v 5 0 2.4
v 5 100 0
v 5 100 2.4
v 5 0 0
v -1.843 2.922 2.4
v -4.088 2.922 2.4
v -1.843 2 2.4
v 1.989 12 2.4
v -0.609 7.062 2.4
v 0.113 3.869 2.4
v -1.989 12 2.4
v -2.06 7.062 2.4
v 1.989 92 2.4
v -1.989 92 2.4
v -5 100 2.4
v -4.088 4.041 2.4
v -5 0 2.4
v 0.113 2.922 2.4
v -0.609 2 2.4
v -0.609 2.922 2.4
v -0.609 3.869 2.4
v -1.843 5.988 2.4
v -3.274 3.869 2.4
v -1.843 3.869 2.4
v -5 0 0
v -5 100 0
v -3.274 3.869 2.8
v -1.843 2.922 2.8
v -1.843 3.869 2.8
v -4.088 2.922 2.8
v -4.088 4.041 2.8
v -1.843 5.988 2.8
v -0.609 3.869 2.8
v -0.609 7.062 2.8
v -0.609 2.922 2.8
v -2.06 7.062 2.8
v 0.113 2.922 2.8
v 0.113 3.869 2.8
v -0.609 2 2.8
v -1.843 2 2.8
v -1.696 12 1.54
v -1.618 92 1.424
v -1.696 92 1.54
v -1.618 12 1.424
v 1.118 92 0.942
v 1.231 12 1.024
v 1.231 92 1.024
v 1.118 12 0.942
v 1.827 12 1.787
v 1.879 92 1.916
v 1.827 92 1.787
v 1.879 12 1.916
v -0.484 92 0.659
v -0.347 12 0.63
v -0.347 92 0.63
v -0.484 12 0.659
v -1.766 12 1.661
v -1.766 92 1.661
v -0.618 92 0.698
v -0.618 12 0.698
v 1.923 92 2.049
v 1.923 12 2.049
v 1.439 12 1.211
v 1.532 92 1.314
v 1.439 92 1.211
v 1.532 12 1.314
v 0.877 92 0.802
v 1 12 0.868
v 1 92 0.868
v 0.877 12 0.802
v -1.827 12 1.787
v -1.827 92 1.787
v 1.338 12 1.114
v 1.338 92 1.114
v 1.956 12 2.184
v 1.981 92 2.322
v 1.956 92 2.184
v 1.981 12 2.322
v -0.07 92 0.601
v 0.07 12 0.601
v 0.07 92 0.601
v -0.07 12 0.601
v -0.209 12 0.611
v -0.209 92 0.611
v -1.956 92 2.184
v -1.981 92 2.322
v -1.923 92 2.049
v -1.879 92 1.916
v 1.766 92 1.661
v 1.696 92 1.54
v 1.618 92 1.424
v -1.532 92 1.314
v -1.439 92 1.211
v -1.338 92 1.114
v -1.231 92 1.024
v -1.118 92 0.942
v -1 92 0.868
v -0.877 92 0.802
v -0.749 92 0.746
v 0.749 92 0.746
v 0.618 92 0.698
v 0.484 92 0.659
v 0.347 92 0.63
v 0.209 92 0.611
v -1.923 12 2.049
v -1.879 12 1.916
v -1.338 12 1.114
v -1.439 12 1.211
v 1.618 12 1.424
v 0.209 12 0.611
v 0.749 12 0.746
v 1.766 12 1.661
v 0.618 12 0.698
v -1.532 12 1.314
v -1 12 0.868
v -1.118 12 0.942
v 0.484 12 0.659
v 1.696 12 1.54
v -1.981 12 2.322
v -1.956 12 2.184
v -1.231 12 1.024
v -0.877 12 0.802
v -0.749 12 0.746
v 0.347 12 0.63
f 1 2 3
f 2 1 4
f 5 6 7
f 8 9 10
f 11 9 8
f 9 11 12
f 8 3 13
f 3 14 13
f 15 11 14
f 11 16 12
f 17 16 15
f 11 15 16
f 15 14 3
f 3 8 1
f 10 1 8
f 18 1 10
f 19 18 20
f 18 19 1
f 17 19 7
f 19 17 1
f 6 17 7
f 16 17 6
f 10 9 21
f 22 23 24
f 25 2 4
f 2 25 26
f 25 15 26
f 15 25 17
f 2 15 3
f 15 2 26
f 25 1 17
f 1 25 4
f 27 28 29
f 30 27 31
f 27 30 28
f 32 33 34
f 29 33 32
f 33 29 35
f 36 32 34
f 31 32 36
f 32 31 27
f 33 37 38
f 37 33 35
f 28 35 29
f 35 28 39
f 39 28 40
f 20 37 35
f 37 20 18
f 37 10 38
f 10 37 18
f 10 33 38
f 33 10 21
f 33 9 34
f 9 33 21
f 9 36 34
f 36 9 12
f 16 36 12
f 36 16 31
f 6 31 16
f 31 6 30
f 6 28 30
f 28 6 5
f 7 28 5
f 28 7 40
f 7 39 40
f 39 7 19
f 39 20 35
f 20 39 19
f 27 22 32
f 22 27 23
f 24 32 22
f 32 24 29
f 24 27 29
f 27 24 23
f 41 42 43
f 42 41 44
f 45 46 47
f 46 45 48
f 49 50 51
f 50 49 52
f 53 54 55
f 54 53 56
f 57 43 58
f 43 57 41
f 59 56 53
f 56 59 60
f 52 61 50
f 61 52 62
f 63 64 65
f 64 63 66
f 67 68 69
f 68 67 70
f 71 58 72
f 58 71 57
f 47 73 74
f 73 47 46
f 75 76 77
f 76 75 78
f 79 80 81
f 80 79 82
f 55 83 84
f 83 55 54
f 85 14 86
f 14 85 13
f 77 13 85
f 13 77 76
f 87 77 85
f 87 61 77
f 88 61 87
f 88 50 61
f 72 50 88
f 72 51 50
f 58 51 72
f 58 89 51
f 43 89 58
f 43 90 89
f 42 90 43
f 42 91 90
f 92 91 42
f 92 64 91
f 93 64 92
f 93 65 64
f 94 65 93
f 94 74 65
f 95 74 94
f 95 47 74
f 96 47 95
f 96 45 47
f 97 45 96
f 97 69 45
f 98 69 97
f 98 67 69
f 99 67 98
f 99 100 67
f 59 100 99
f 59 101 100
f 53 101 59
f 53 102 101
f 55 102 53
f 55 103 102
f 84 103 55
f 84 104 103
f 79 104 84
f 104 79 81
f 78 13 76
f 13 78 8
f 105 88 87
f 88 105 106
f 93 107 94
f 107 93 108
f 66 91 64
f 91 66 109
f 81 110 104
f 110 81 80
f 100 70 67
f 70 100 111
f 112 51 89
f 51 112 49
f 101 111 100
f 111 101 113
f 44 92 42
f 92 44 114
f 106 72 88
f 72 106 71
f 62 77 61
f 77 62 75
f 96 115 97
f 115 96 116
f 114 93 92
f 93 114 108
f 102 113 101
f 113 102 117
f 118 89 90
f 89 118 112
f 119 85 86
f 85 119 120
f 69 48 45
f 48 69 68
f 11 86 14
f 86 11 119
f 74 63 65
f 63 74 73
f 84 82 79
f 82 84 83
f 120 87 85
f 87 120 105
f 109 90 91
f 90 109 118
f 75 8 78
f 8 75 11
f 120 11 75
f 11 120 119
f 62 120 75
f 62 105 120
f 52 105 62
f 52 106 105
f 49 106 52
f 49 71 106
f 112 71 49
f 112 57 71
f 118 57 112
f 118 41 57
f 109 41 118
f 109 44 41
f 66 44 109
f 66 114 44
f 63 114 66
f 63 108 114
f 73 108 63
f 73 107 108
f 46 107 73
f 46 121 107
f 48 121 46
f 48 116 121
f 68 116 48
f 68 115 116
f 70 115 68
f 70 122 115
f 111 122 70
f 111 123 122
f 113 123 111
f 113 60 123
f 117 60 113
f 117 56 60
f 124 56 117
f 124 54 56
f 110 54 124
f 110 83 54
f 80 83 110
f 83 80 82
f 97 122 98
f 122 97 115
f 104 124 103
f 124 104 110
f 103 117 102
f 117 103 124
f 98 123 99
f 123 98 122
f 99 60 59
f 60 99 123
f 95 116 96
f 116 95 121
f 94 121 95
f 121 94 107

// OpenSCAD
// file: module/drill-bit-storage.scad
/*
    Drill bit storage
*/

$fn=90;  // accuracy


// Constants (Don't change)
storageLenght = 100; // Not Bit lenght
maxBitLenght  = 70;  // Check bit lenght
storageWidth  = 10;  // Minimum width

// Bit dependent
bitDiameter = 4.0;



module drillBitStorage (bitDiameter,maxBitLenght,
	storageWidth,storageLenght){

// Automatic Variables  (Don't change)
diameterText      = str(bitDiameter);
storageHight      = bitDiameter*0.6; 
bitRadius         = bitDiameter/2;
bitPositionHeight = storageHight+bitDiameter*0.05; 


// Delition for crating drill track
difference() {

// Union for text and storage
union(){

// Storage 
translate([
    -storageWidth/2,    // Centering
    0, 
    0
    ]) 
cube(size = [
    storageWidth,
    storageLenght,
    storageHight
    ]);

// Milimiter dimension text
translate([
    -4.4,               // Fine deling x-axis
    2,                  // Fine deling y-axis 
    storageHight         
    ])
linear_extrude(height=0.4)text(
    diameterText,  // Dynamic text
    size=5,
    font="tohoma:style=bold",
    spacing=0.9
    );
    
// End of union    
}  

// Begining of Delition
// Drill tracl
rotate([90,0,0])
translate([
    0,                   // x-axis
    bitPositionHeight,   // Z-axis
    -(maxBitLenght+12)    // y-axis
    ])  
cylinder(
    h = maxBitLenght,    // y-axis
    r = bitRadius        // x-axis 
    );      

// End of Delition
}}
// main file
/*
    Drill bit storage
*/

$fn=90;  // accuracy

// import module
use <module/drill-bit-storage.scad>;



// Tootale lenght of the unit
storageLenght = 100; 

// Width of the unit
storageWidth  = 10;  // (Constant under 4mm)  

// The lenght of the drill bit
maxBitLenght  = 80;  

// Drill bit diameter  
bitDiameter = 4.0;


// Call the module
drillBitStorage 
    (bitDiameter,maxBitLenght,storageWidth,storageLenght);
